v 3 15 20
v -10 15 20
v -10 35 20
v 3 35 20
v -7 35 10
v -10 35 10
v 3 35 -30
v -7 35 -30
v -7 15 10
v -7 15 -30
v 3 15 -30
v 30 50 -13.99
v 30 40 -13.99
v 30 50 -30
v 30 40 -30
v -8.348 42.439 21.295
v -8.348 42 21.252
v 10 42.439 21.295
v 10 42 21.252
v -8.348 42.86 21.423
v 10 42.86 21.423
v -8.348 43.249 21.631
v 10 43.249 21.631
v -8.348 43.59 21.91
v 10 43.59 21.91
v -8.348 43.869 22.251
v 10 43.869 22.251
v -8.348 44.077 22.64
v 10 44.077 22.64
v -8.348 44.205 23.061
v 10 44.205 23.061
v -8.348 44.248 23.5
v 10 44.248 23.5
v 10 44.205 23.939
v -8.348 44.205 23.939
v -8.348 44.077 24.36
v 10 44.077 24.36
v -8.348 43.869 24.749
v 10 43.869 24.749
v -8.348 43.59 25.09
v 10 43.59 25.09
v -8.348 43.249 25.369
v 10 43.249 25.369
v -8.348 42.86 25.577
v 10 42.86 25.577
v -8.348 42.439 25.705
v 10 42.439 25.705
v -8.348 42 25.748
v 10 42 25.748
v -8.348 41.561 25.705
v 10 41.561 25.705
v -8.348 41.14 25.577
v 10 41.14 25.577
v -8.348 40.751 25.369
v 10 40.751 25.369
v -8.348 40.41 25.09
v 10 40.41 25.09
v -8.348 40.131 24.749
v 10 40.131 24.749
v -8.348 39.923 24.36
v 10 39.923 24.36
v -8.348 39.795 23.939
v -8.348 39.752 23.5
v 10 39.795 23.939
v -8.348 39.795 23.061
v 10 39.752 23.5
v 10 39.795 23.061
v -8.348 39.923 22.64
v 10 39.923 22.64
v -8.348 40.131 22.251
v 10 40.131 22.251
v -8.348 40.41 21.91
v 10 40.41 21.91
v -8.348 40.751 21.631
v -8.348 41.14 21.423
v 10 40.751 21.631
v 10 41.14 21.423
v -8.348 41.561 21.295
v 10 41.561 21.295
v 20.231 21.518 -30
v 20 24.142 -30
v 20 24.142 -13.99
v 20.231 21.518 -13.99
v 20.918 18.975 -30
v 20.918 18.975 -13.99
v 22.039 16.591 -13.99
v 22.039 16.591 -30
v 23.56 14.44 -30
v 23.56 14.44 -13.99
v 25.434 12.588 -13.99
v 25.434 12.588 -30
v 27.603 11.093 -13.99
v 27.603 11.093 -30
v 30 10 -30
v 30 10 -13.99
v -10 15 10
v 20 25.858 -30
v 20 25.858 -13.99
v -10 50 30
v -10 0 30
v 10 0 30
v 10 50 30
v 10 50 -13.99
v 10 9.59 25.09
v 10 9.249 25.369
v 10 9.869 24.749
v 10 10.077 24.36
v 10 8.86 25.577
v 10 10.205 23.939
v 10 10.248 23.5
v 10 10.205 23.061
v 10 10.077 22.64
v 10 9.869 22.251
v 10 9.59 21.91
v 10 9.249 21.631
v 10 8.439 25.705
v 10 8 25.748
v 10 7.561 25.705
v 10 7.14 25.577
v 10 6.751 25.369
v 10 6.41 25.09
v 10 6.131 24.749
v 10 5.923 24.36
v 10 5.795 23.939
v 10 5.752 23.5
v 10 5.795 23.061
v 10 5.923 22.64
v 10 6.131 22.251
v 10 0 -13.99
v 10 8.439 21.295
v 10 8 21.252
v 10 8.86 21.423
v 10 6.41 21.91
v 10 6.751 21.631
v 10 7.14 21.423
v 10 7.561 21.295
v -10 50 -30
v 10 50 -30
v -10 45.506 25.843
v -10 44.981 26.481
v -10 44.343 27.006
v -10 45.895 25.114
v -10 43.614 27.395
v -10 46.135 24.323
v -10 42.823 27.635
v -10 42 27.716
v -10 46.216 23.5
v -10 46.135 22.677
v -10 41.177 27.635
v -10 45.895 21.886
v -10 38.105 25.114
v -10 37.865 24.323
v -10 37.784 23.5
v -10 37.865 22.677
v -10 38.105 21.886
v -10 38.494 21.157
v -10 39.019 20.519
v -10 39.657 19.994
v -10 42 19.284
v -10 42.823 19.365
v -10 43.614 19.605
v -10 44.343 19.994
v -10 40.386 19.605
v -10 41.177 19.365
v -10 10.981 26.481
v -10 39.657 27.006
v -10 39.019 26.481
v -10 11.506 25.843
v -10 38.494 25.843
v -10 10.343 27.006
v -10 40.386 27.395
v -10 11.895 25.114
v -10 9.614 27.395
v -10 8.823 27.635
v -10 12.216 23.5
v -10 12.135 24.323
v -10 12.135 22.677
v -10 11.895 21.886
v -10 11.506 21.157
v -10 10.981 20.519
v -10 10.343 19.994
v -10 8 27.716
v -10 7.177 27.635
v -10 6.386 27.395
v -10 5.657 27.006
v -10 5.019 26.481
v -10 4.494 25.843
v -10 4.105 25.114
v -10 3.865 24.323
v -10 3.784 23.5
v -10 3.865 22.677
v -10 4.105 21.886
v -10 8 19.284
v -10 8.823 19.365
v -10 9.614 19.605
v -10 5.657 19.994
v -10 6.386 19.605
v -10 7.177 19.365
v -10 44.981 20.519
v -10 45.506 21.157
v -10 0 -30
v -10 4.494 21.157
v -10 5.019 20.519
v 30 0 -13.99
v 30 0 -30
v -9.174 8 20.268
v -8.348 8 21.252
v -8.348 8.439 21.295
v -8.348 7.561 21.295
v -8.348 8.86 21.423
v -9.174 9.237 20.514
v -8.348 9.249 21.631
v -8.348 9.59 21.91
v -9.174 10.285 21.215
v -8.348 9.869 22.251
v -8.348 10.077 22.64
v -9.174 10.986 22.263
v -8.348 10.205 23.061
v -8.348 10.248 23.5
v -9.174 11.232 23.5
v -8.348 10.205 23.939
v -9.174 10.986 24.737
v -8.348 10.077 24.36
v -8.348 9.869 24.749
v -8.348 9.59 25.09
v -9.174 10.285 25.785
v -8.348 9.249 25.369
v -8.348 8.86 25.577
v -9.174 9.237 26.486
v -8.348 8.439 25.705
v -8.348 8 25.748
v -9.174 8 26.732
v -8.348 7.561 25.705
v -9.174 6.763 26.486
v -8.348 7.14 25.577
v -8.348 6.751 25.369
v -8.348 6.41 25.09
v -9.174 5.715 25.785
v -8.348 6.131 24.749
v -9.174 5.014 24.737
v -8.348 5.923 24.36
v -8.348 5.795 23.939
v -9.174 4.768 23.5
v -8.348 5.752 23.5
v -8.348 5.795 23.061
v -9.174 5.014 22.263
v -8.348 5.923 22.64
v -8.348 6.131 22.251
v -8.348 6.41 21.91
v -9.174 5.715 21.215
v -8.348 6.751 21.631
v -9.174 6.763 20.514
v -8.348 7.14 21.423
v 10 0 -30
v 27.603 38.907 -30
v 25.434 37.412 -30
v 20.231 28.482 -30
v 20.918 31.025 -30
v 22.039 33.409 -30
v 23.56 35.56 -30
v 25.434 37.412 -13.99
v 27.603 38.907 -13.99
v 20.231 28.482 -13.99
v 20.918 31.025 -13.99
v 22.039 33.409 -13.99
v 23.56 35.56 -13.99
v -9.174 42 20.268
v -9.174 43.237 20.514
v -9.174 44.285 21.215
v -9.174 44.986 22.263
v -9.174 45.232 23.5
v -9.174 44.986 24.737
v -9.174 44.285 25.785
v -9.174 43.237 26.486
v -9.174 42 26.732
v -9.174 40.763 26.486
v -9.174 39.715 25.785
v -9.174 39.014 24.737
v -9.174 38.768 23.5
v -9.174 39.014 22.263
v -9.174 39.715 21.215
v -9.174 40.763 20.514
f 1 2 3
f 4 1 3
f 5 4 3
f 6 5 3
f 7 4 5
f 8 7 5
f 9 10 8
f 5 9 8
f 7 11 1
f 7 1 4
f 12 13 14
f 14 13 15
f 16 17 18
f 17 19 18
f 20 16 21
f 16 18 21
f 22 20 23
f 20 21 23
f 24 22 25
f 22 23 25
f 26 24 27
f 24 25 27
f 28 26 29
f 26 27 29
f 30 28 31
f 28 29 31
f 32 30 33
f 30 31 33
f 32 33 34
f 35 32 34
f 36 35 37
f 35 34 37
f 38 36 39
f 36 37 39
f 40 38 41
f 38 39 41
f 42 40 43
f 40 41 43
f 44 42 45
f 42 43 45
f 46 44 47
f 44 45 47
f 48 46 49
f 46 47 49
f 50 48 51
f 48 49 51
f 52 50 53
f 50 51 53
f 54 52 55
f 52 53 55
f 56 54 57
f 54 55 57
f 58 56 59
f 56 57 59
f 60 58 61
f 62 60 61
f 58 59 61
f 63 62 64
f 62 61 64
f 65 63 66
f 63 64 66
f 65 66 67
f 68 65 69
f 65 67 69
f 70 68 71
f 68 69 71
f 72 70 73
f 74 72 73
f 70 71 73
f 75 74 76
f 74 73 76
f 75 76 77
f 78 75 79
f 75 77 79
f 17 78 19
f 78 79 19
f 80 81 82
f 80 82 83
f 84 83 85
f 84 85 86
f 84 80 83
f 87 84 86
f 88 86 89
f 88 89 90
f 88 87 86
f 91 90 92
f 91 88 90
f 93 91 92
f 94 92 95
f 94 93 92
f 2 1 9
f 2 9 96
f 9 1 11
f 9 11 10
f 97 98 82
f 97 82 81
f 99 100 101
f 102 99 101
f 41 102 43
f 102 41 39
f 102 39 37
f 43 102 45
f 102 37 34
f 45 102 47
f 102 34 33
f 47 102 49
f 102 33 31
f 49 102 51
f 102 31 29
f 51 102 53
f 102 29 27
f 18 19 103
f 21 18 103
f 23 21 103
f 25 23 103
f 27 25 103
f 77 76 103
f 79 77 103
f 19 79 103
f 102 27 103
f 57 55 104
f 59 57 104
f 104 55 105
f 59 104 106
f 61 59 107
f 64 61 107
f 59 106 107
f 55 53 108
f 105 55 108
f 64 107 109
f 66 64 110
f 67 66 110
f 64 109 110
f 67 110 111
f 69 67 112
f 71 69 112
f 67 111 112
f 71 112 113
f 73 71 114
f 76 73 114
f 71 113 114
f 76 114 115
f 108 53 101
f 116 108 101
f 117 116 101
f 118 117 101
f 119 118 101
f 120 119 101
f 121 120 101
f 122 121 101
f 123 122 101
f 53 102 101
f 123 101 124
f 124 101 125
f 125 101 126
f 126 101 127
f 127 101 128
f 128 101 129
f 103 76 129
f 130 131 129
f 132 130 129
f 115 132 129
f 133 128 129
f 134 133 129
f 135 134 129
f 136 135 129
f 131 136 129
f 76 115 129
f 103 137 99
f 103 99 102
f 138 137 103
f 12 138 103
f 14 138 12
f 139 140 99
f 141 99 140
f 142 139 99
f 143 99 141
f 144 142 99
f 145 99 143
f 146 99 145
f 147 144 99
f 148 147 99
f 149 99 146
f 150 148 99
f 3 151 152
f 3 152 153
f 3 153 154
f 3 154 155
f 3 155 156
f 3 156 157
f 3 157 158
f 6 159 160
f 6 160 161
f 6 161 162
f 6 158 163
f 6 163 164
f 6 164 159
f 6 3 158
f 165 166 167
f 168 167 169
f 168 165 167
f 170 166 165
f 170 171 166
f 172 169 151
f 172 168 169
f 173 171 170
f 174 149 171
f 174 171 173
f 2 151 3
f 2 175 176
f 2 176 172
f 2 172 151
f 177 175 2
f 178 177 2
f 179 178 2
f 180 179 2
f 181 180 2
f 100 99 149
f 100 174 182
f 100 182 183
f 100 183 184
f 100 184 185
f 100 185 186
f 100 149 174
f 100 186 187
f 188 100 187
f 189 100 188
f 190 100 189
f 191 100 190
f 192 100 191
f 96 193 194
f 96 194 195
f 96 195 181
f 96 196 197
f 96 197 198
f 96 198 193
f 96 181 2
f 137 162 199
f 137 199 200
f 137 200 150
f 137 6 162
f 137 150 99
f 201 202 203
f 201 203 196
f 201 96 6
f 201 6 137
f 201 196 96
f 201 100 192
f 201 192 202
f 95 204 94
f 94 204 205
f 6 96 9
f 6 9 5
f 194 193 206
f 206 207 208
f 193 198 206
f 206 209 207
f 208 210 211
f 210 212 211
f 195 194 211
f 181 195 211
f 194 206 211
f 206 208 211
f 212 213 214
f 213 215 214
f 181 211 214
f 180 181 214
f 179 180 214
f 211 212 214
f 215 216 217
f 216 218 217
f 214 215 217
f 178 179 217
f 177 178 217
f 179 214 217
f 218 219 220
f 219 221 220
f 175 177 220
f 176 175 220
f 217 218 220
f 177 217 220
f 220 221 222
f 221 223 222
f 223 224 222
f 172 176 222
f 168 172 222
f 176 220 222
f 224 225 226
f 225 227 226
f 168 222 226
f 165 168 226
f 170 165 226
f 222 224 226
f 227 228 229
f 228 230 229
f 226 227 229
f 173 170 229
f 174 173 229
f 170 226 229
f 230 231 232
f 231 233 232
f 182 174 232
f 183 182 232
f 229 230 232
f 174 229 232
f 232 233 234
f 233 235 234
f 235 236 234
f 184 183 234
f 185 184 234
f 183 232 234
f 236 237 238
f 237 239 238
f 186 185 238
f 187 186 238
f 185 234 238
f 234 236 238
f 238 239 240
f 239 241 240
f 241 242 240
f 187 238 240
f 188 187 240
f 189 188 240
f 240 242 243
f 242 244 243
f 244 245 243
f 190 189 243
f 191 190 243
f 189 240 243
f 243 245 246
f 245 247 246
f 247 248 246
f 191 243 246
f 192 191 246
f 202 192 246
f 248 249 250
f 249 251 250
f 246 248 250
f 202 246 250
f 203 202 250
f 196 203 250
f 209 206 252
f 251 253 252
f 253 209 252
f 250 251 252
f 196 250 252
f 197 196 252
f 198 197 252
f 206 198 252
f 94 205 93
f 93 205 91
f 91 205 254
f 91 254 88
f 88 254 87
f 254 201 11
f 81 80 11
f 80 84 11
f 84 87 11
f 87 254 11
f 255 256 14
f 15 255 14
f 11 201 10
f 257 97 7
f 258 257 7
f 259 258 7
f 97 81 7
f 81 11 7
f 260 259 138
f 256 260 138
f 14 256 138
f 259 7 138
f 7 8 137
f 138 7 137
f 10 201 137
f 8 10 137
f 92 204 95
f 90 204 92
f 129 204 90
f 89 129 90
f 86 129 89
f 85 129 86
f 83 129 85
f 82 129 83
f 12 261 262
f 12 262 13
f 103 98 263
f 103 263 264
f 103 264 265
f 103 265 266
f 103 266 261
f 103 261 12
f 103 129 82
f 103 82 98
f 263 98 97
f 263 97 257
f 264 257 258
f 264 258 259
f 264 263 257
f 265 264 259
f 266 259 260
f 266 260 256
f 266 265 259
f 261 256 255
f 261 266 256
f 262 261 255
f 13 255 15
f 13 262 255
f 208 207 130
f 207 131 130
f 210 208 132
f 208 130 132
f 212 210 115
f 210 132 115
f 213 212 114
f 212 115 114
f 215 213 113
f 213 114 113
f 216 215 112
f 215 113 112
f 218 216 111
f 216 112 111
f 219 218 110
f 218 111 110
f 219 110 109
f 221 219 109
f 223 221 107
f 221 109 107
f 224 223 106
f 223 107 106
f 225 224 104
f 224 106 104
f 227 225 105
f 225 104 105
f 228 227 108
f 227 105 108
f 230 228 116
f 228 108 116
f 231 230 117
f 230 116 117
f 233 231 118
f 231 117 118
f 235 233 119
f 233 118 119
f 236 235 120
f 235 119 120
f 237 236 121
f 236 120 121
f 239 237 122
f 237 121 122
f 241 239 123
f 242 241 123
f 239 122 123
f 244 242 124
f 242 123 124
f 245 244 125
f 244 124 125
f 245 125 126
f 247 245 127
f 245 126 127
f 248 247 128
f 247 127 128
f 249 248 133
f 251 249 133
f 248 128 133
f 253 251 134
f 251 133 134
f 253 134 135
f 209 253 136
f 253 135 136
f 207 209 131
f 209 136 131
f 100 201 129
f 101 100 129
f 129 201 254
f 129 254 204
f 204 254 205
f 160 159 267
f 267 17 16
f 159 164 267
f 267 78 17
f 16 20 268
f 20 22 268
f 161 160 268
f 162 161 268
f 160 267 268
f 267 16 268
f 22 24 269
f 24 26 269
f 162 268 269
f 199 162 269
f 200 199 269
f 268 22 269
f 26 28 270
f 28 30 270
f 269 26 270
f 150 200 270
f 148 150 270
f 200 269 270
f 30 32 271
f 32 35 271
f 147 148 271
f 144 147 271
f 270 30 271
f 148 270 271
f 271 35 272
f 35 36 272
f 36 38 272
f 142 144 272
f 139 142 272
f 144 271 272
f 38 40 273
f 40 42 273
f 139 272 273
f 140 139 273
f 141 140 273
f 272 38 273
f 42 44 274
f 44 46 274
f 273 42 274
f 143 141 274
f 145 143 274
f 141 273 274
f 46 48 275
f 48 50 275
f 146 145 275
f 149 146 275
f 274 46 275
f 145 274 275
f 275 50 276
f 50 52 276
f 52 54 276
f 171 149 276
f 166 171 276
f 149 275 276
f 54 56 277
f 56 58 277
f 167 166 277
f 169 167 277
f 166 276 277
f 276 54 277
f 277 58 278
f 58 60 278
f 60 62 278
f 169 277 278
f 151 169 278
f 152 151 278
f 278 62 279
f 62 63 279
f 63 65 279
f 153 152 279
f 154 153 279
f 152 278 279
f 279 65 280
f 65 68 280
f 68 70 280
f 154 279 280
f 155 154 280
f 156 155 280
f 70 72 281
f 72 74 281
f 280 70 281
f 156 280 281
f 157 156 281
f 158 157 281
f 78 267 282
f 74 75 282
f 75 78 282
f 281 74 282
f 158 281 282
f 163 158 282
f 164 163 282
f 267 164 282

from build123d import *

# Parameters (mm, degrees)
SKETCH3_W                                         = 20
SKETCH3_H                                         = 60
SKETCH3_H_2                                       = 16.009607205
BOSS_EXTRUDE1_DEPTH                               = 50
SKETCH4_W                                         = 16.009607205
SKETCH4_H                                         = 30
CUT_EXTRUDE1_DEPTH                                = 10
FILLET4_R                                         = 15
CSK_FOR_8_FLAT_HEAD_MACHINE_SCREW_100_D           = 4.4958
CSK_FOR_8_FLAT_HEAD_MACHINE_SCREW_100_CSINK_D     = 8.4328
CSK_FOR_8_FLAT_HEAD_MACHINE_SCREW_100_CSINK_ANGLE = 100
SKETCH7_W                                         = 10
SKETCH7_H                                         = 20
CUT_EXTRUDE2_DEPTH                                = 50
SKETCH8_W                                         = 10
SKETCH8_H                                         = 20
CUT_EXTRUDE3_DEPTH                                = 13


with BuildPart() as part:
    # Sketch3 → Boss-Extrude1 (new body)
    with BuildSketch(Plane(origin=(0, 0, 0), x_dir=(1, 0, 0), z_dir=(0, 1, 0))):
        Rectangle(SKETCH3_W, SKETCH3_H)
        with Locations((20, 21.995196398)):
            Rectangle(SKETCH3_W, SKETCH3_H_2)
    extrude(amount=BOSS_EXTRUDE1_DEPTH)

    # Sketch4 → Cut-Extrude1 (cut)
    with BuildSketch(Plane(origin=(30, 0, 0), x_dir=(0, 0, -1), z_dir=(1, 0, 0))):
        with Locations((21.995196398, 25)):
            Rectangle(SKETCH4_W, SKETCH4_H)
    extrude(amount=-CUT_EXTRUDE1_DEPTH, mode=Mode.SUBTRACT)

    # Fillet4
    # the kernel refuses this fillet: 15 mm, written as the material it adds along each edge
    with BuildSketch(Plane(origin=(20, 10, -30), x_dir=(1, 0, 0), z_dir=(0, 0, 1))) as fillet4_piece_1:
        with BuildLine():
            CenterArc((15, 14.142135624), FILLET4_R, 180, 70.528779366)
            Line((0, 14.142135624), (-0.3, 14.142135624))
            Line((-0.3, 14.142135624), (-0.3, 0))
            Line((-0.3, 0), (0, -0.3))
            ThreePointArc((0, -0.3), (5, -0.3), (9.9, -0.282842712))
            Line((9.9, -0.282842712), (10, 0))
        make_face()
    extrude(amount=16.009607205)
    with BuildSketch(Plane(origin=(20, 40, -13.990392795), x_dir=(0, -1, 0), z_dir=(0, 0, -1))) as fillet4_piece_2:
        with BuildLine():
            CenterArc((14.142135624, -15), FILLET4_R, 90, 70.528779366)
            Line((0, -10), (-0.282842712, -9.9))
            ThreePointArc((-0.282842712, -9.9), (-0.3, -5), (-0.3, 0))
            Line((-0.3, 0), (0, 0.3))
            Line((0, 0.3), (14.142135624, 0.3))
            Line((14.142135624, 0.3), (14.142135624, 0))
        make_face()
    extrude(amount=16.009607205)

    # CSK for #8 Flat Head Machine Screw (100)1 (through all)
    with Locations(Plane.ZY.offset(10)):
        with Locations((23.5, 8), (23.5, 42)):
            CounterSinkHole(CSK_FOR_8_FLAT_HEAD_MACHINE_SCREW_100_D / 2, CSK_FOR_8_FLAT_HEAD_MACHINE_SCREW_100_CSINK_D / 2, counter_sink_angle=CSK_FOR_8_FLAT_HEAD_MACHINE_SCREW_100_CSINK_ANGLE)

    # Sketch7 → Cut-Extrude2 (cut)
    with BuildSketch(Plane(origin=(0, 0, -30), x_dir=(-1, 0, 0), z_dir=(0, 0, -1))):
        with Locations((2, 25)):
            Rectangle(SKETCH7_W, SKETCH7_H)
    extrude(amount=-CUT_EXTRUDE2_DEPTH, mode=Mode.SUBTRACT)

    # Sketch8 → Cut-Extrude3 (cut)
    with BuildSketch(Plane.ZY.offset(10)):
        with Locations((15, 25)):
            Rectangle(SKETCH8_W, SKETCH8_H)
    extrude(amount=-CUT_EXTRUDE3_DEPTH, mode=Mode.SUBTRACT)


solid = part.part
